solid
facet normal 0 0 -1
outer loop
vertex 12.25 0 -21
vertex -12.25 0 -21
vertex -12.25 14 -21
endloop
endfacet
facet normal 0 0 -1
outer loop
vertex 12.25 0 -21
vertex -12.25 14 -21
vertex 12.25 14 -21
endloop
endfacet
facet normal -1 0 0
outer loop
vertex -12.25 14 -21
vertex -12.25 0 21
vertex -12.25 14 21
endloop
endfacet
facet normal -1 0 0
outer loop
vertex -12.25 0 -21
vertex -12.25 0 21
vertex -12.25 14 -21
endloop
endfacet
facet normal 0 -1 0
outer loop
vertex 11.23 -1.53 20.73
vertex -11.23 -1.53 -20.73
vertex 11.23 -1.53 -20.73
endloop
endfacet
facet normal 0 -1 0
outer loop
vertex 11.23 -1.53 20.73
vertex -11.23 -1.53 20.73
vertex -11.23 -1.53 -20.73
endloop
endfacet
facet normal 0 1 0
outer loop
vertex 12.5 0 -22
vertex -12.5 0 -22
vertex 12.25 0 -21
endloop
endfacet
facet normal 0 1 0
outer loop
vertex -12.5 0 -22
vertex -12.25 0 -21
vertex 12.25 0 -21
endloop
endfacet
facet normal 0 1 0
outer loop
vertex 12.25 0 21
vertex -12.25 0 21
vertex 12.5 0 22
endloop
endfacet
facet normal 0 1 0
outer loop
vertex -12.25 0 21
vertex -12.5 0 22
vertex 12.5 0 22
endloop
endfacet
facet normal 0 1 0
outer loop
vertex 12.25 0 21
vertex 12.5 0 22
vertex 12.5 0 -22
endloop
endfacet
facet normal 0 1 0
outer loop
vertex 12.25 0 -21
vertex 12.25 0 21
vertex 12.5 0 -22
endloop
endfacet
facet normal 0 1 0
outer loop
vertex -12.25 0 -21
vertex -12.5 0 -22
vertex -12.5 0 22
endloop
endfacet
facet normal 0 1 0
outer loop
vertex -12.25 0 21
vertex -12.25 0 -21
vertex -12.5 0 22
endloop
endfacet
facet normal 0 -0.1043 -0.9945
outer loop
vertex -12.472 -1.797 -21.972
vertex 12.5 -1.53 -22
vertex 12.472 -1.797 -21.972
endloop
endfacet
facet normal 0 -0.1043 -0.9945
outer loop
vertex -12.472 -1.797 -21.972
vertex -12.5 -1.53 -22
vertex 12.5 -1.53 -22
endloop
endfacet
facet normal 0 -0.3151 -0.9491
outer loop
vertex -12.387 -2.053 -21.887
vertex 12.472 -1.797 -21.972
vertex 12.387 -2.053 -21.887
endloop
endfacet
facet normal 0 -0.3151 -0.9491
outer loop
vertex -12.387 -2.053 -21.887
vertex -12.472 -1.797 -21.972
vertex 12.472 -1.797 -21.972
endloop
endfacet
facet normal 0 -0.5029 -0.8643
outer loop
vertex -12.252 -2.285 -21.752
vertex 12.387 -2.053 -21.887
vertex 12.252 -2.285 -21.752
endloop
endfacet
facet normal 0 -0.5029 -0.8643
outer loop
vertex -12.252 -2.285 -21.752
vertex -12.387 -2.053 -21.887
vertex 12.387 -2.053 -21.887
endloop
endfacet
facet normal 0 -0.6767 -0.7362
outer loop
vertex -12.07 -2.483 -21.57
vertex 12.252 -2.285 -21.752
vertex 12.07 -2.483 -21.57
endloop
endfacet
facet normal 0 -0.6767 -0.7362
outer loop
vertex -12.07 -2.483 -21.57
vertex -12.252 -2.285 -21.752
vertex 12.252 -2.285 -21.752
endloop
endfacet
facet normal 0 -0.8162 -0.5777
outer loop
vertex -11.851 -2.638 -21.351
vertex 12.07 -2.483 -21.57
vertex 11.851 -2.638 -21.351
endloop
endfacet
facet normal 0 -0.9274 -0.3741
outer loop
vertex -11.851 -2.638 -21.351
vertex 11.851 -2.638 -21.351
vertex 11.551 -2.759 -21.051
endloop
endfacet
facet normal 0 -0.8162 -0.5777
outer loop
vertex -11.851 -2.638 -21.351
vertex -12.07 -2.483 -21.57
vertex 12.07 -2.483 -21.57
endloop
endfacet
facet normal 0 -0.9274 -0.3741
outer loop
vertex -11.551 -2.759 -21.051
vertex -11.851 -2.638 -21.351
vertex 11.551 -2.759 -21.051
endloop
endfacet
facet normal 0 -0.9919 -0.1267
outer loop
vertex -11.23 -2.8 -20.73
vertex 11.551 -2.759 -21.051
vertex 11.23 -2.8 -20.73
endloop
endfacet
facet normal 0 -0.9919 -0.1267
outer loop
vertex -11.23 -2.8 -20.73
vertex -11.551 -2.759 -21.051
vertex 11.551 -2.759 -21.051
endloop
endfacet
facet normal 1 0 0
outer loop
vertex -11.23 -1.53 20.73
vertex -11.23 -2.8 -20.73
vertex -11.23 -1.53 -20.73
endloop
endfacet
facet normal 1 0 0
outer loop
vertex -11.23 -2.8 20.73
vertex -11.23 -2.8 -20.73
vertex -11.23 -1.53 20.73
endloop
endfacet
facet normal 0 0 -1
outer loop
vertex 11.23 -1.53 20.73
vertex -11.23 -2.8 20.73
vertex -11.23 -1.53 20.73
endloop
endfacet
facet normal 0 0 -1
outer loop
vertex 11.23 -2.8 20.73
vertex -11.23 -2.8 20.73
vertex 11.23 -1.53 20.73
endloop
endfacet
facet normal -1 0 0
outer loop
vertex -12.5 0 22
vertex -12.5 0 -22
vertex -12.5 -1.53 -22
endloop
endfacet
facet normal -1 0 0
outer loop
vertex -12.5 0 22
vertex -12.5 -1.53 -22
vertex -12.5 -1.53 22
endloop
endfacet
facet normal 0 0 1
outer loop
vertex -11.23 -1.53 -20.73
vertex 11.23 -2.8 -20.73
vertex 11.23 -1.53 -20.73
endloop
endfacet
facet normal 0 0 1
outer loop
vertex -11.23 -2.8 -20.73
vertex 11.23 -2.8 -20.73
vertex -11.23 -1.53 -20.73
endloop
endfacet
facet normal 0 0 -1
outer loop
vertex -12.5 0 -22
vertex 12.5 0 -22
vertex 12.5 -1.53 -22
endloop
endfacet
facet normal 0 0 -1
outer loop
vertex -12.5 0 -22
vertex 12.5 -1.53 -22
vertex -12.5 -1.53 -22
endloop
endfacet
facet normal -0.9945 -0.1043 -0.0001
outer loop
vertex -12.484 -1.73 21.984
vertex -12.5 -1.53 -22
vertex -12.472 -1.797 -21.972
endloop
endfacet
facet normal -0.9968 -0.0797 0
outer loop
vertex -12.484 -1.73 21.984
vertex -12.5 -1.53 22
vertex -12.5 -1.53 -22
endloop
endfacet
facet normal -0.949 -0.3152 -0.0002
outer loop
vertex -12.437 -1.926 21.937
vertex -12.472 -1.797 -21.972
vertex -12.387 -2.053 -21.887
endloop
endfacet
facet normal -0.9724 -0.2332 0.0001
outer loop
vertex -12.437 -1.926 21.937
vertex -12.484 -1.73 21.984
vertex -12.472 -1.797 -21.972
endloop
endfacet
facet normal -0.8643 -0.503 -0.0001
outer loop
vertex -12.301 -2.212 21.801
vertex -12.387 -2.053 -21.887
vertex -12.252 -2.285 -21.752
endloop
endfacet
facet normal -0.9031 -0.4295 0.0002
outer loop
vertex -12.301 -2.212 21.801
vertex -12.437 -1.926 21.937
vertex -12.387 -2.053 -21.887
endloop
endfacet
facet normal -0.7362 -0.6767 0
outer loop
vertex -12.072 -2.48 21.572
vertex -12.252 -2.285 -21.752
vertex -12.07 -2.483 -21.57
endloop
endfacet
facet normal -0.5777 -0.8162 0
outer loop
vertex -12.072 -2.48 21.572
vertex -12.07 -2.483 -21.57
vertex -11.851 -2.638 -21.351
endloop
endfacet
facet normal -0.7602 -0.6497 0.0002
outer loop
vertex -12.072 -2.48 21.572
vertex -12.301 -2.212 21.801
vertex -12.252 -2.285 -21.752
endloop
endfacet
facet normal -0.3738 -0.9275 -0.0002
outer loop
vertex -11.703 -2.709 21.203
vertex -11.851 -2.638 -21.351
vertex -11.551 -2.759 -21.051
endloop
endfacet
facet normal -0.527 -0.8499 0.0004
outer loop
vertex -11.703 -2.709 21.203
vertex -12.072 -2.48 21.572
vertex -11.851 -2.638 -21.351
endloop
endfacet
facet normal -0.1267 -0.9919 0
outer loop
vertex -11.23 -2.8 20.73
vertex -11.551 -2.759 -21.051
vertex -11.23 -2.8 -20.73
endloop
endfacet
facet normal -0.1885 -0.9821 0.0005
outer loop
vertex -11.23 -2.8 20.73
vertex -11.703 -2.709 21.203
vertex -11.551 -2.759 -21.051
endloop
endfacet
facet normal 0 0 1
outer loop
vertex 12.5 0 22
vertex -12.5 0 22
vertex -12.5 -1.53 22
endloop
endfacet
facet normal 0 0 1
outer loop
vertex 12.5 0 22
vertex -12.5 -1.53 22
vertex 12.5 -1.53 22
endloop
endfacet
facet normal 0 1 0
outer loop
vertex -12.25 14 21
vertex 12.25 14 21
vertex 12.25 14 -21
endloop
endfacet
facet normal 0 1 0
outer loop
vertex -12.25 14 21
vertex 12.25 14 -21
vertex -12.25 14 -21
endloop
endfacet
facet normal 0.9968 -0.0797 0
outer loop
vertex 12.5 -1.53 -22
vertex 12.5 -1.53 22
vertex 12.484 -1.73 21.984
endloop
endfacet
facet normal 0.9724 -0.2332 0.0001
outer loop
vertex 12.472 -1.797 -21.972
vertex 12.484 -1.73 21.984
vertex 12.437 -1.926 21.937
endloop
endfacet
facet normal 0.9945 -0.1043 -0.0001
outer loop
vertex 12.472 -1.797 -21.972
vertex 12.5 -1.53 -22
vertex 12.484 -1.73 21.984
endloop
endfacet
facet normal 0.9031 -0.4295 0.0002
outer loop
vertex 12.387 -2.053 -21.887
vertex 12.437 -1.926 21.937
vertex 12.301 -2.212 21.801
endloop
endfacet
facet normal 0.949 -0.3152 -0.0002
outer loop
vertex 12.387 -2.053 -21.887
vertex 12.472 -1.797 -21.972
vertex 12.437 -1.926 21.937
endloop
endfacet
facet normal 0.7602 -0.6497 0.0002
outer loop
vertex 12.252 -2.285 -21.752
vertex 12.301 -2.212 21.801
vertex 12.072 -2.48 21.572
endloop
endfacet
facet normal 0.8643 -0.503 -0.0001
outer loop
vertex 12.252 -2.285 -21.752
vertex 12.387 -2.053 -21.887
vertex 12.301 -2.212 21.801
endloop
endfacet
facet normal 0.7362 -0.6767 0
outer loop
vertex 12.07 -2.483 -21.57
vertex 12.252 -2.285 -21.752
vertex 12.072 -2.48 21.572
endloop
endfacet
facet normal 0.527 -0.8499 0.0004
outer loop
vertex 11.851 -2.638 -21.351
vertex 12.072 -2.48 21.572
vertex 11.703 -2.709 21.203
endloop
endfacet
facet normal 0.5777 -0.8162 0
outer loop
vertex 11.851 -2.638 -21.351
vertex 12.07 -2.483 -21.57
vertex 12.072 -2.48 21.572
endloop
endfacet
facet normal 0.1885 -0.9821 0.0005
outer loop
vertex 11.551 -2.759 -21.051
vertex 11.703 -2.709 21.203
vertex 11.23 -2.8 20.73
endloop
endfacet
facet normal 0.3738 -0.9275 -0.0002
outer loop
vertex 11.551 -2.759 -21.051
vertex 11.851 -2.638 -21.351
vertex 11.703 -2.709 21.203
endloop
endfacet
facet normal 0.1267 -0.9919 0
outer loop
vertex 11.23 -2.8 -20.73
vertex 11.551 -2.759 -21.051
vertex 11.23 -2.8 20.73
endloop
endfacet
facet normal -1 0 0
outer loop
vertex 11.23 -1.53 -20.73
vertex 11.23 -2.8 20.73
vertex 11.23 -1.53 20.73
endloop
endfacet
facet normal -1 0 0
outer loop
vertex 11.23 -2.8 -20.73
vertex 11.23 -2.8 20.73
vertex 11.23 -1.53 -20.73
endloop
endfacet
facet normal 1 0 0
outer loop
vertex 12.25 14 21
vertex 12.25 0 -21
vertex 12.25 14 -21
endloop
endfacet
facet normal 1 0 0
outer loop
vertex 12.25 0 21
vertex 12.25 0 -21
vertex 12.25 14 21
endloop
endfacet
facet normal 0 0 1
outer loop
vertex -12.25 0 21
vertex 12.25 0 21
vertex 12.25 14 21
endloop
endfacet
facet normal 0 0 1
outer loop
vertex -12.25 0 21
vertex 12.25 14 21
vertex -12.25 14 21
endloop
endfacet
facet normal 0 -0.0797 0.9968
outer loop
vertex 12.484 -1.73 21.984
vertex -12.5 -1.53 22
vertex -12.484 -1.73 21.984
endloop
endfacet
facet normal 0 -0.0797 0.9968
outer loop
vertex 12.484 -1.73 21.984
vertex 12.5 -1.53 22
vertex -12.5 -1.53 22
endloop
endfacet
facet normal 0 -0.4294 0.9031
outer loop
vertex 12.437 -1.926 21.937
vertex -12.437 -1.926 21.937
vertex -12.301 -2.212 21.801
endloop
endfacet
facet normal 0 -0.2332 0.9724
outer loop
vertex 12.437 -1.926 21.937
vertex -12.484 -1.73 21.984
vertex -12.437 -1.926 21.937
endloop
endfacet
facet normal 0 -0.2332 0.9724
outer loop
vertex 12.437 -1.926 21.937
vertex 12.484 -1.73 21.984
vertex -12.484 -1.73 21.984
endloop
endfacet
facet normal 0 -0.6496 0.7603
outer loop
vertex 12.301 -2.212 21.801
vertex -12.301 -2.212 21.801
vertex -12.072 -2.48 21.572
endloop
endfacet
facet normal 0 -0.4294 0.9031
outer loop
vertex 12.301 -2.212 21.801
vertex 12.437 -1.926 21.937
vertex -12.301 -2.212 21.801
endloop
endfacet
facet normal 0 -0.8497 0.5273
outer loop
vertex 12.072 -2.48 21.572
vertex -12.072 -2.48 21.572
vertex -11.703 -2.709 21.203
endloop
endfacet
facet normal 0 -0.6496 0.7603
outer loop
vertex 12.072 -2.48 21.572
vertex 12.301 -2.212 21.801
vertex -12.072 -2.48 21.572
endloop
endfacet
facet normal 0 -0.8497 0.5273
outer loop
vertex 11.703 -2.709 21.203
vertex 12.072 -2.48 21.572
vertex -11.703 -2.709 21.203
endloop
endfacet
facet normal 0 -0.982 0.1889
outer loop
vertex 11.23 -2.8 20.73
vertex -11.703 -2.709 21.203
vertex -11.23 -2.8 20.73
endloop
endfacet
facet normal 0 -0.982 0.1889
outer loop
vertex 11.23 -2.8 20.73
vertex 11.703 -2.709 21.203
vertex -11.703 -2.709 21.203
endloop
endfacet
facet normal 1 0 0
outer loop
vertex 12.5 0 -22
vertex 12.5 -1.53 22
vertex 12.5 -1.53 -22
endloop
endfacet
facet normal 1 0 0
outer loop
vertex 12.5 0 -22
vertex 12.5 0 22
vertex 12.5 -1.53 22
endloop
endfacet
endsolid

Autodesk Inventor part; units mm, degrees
ref_plane "YZ Plane" through (0, 0, 0) normal (1, 0, 0) x (0, 1, 0)
ref_plane "XZ Plane" through (0, 0, 0) normal (0, 1, 0) x (-1, 0, 0)
ref_plane "XY Plane" through (0, 0, 0) normal (0, 0, 1) x (1, 0, 0)
sketch "Sketch1" plane through (0, 0, 0) normal (0, 1, 0) x (-1, 0, 0)
  line L0 (-12.25, 21) -> (12.25, 21)
  line L1 (12.25, 21) -> (12.25, -21)
  line L2 (12.25, -21) -> (-12.25, -21)
  line L3 (-12.25, -21) -> (-12.25, 21)
  line L4 (-12.25, 21) -> (12.25, -21) construction
  line L5 (12.25, 21) -> (-12.25, -21) construction
  point P0 (0, 0)
  dimension "d0" = 24.5
  dimension "d1" = 42
extrude "Extrusion1" add sketch "Sketch1" along normal blind 14
sketch "Sketch2" plane through (0, 0, 0) normal (0, -1, 0) x (1, 0, 0)
  line L0 (12.5, -22) -> (-12.5, -22)
  line L1 (-12.5, -22) -> (-12.5, 22)
  line L2 (-12.5, 22) -> (12.5, 22)
  line L3 (12.5, 22) -> (12.5, -22)
  line L4 (12.5, -22) -> (-12.5, 22) construction
  line L5 (-12.5, -22) -> (12.5, 22) construction
  point P0 (0, 0)
  dimension "d4" = 25
  dimension "d5" = 44
extrude "Extrusion2" add sketch "Sketch2" along normal blind 2.8
fillet "Fillet1" radius 1.27 4 edges at (0, -2.8, 22) (12.5, -2.8, 0) (0, -2.8, -22) (-12.5, -2.8, 0)
sketch "Sketch3" plane through (0, -2.8, 0) normal (0, -1, 0) x (1, 0, 0)
  line L0 (-11.23, -20.73) -> (-11.23, 20.73) projected
  line L1 (11.23, -20.73) -> (-11.23, -20.73)
  line L2 (-11.23, -20.73) -> (-11.23, 20.73)
  line L3 (-11.23, 20.73) -> (11.23, 20.73)
  line L4 (11.23, 20.73) -> (11.23, -20.73)
  line L5 (11.23, -20.73) -> (-11.23, 20.73) construction
  line L6 (-11.23, -20.73) -> (11.23, 20.73) construction
  point P0 (0, 0)
extrude "Extrusion3" cut sketch "Sketch3" against normal blind 1.27
properties part number "BatteryVoltage"
